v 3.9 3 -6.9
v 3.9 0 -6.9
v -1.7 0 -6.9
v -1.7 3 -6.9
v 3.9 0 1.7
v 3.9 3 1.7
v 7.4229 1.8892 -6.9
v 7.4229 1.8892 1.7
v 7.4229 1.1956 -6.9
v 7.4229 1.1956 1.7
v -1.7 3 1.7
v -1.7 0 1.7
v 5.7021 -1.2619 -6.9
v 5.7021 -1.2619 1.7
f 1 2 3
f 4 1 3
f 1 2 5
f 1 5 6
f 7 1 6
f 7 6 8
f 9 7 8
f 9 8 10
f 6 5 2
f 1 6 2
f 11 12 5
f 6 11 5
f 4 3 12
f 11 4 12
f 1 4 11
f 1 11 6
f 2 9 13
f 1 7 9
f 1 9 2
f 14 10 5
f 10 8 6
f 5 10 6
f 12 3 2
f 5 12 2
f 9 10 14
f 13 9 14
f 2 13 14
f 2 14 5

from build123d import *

# Parameters (mm, degrees)
HOUSING_DEPTH      = 3
KINK_HOUSING_DEPTH = 8.6


with BuildPart() as part:
    # Sketch1 → Housing (new body)
    with BuildSketch(Plane(origin=(0, 0, 0), x_dir=(1, 0, 0), z_dir=(0, 1, 0))):
        Polygon((3.9, 6.9), (-1.7, 6.9), (-1.7, -1.7), (3.9, -1.7), (3.9, 5.2), align=None)
    extrude(amount=HOUSING_DEPTH)


with BuildPart() as body_2:
    # Tilted Magnet → Kink Housing (new body)
    with BuildSketch(Plane(origin=(0, 0, -6.9), x_dir=(-1, 0, 0), z_dir=(0, 0, -1))):
        Polygon((-3.9, 3), (-7.422863806, 1.889245308), (-7.422863806, 1.195587973), (-5.702134497, -1.26186816), (-3.9, 0), align=None)
    extrude(amount=-KINK_HOUSING_DEPTH)


solid = Compound([part.part, body_2.part])
